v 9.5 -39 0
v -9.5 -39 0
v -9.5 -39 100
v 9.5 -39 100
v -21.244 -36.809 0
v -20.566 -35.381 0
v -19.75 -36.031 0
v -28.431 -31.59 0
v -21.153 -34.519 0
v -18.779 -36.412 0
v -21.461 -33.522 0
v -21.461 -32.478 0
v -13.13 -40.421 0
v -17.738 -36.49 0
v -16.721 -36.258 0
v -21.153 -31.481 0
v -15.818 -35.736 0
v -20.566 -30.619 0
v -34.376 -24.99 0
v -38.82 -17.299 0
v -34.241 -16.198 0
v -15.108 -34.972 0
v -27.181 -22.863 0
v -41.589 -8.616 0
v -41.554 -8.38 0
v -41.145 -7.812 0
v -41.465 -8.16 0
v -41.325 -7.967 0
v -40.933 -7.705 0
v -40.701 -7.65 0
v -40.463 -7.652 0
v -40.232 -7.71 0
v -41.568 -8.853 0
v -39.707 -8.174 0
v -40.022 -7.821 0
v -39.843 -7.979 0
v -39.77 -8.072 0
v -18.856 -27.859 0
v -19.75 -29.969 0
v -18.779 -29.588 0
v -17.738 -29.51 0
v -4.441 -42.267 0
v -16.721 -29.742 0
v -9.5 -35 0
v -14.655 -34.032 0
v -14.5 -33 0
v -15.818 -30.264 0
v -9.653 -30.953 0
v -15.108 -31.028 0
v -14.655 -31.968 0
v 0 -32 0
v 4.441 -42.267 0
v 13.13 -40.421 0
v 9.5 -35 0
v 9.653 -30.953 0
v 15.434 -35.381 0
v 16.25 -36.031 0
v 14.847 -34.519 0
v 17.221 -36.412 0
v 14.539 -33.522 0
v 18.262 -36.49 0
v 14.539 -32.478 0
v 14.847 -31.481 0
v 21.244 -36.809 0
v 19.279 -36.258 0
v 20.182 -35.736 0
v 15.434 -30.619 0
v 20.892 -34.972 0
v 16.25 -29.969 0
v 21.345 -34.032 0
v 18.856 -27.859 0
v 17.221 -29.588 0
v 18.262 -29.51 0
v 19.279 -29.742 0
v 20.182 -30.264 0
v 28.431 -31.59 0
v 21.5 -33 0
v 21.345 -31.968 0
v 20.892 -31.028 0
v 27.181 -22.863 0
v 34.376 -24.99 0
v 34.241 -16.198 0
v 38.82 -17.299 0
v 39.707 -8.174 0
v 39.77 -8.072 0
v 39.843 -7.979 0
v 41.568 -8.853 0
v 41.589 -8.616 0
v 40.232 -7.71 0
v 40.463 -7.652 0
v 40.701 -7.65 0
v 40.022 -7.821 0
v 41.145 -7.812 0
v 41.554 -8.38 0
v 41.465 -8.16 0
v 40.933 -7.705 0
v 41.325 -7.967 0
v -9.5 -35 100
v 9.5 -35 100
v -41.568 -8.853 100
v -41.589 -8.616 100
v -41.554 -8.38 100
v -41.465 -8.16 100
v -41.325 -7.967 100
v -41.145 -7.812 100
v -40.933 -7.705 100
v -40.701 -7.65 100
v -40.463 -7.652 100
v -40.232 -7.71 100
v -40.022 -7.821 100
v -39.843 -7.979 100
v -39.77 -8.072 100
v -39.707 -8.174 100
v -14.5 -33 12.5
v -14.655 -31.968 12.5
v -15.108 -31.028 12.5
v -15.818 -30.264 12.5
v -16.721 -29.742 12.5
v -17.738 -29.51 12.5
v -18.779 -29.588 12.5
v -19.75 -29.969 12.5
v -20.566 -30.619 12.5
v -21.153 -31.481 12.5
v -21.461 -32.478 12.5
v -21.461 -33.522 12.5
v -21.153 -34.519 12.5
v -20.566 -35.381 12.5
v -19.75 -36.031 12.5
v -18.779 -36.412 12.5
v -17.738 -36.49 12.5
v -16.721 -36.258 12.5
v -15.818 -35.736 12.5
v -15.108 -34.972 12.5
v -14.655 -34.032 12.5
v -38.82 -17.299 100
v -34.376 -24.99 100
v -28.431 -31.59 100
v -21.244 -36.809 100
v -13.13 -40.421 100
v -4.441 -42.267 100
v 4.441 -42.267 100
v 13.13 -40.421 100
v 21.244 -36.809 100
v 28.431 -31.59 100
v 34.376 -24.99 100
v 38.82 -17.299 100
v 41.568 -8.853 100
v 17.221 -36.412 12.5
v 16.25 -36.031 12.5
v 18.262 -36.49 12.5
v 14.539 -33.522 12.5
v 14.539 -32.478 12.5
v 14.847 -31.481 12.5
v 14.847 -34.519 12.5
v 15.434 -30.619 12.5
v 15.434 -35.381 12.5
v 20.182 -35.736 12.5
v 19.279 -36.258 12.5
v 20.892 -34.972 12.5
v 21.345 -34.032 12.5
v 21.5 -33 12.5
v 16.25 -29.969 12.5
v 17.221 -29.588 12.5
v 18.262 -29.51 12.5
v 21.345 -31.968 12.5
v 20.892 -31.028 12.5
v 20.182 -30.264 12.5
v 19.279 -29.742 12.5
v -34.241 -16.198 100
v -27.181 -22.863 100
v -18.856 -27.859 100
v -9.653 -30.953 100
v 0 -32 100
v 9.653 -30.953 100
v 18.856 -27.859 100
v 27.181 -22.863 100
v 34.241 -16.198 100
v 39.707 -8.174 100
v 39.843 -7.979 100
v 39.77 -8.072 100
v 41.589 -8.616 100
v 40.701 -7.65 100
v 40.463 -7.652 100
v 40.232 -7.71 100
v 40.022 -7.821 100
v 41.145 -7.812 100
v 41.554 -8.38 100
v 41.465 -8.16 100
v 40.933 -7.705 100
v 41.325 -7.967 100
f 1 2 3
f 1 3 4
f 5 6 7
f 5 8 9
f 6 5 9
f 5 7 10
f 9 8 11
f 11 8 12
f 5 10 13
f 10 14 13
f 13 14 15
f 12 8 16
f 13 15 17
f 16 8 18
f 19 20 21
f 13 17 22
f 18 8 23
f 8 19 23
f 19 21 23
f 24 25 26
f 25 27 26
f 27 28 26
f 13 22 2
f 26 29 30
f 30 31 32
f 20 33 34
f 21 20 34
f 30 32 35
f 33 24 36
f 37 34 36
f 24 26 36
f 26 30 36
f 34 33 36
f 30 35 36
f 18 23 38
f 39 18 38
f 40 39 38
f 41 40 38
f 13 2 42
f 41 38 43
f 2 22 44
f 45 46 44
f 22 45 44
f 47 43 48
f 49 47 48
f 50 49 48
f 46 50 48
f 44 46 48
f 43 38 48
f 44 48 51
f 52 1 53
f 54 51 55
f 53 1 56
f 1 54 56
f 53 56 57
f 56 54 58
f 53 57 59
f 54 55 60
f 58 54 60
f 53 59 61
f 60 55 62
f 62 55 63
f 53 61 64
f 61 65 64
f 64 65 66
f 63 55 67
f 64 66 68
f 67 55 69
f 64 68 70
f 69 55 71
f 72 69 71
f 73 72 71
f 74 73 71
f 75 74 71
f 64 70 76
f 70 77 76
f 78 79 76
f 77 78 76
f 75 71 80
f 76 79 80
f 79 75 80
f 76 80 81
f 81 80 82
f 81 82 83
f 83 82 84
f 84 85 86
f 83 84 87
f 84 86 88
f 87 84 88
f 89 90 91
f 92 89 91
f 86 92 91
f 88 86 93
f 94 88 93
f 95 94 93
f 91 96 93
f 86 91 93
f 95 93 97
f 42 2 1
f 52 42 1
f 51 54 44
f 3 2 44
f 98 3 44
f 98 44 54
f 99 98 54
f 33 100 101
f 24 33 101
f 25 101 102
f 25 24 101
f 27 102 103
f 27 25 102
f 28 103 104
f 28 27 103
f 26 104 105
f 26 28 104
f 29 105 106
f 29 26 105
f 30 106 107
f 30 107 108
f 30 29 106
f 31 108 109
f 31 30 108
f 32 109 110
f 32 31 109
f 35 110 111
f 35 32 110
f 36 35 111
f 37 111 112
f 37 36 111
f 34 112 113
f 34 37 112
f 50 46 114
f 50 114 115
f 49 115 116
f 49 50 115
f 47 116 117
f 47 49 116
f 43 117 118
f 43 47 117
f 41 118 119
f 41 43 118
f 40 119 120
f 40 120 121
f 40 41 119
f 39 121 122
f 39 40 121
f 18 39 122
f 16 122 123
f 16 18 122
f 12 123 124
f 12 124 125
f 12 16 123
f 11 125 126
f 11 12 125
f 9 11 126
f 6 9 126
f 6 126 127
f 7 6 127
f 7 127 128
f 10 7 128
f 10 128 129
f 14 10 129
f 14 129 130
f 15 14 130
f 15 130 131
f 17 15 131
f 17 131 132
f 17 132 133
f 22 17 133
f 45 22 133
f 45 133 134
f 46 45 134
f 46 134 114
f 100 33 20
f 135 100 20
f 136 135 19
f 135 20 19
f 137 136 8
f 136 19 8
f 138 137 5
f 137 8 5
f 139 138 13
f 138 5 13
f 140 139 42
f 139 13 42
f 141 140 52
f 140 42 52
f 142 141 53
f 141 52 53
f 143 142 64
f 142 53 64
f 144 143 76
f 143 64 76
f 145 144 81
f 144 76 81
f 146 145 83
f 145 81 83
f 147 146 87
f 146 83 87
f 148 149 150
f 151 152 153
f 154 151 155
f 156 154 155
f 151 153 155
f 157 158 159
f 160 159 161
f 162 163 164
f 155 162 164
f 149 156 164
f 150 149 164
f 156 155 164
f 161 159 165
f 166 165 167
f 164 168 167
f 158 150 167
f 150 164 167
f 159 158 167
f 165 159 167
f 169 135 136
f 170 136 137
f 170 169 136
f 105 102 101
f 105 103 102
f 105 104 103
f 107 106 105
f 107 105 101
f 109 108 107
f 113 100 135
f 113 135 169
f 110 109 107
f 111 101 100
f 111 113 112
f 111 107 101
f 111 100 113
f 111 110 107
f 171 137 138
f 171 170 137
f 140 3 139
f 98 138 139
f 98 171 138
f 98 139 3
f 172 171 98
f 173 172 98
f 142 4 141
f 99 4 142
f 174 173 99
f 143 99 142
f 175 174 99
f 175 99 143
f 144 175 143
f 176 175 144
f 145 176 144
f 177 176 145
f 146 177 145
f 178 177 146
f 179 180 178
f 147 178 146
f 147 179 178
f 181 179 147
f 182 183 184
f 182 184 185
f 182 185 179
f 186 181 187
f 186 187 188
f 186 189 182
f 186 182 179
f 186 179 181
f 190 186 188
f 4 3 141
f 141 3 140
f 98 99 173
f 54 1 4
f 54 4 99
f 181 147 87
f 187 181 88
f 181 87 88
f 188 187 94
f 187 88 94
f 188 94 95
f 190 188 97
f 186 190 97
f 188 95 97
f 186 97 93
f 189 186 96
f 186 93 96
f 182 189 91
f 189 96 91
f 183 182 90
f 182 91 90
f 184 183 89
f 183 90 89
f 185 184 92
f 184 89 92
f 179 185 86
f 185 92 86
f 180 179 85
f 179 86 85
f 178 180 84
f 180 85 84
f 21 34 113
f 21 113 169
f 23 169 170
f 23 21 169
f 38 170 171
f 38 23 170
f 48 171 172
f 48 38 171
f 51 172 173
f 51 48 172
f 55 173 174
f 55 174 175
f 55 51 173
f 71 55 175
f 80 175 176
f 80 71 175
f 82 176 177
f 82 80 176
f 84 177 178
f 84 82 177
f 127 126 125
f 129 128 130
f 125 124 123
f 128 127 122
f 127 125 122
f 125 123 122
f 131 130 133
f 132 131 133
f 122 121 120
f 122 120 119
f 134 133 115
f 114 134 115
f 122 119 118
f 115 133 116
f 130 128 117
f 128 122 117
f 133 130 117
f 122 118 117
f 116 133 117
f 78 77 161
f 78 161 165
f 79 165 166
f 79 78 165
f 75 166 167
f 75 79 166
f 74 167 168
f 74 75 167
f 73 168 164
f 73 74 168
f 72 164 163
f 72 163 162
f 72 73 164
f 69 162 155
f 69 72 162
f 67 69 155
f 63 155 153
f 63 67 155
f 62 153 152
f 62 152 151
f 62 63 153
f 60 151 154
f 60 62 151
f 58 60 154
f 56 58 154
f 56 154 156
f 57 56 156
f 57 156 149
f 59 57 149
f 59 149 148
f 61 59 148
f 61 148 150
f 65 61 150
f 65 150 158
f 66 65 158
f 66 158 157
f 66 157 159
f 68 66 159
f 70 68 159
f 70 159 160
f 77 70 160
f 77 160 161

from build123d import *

# Parameters (mm, degrees)
CYLINDER010_R     = 3.5
CYLINDER010_DEPTH = 25
CYLINDER006_R     = 3.5
CYLINDER006_DEPTH = 25
BOX_W             = 19
BOX_H             = 4
BOX_DEPTH         = 100
CYLINDER001_R     = 45
CYLINDER001_DEPTH = 100
CYLINDER_R        = 42.5
CYLINDER_DEPTH    = 100
FILLET_R          = 1
FILLET001_R       = 1


with BuildPart() as cylindre010:
    # Cylinder010 → Cylinder010 (new body)
    with BuildSketch(Plane(origin=(18, -33, -12.5), x_dir=(1, 0, 0), z_dir=(0, 0, 1))):
        Circle(CYLINDER010_R)
    extrude(amount=CYLINDER010_DEPTH)


with BuildPart() as cylindre006:
    # Cylinder006 → Cylinder006 (new body)
    with BuildSketch(Plane(origin=(-18, -33, -12.5), x_dir=(1, 0, 0), z_dir=(0, 0, 1))):
        Circle(CYLINDER006_R)
    extrude(amount=CYLINDER006_DEPTH)


with BuildPart() as cube:
    # Box → Box (new body)
    with BuildSketch(Plane(origin=(-9.5, -39, 0), x_dir=(1, 0, 0), z_dir=(0, 0, 1))):
        with Locations((9.5, 2)):
            Rectangle(BOX_W, BOX_H)
    extrude(amount=BOX_DEPTH)


with BuildPart() as cylindre001:
    # Cylinder001 → Cylinder001 (new body)
    with BuildSketch(Plane(origin=(0, 13, 0), x_dir=(1, 0, 0), z_dir=(0, 0, 1))):
        Circle(CYLINDER001_R)
    extrude(amount=CYLINDER001_DEPTH)


with BuildPart() as cut009:
    # Cylinder → Cylinder (new body)
    with BuildSketch(Plane.XY):
        Circle(CYLINDER_R)
    extrude(amount=CYLINDER_DEPTH)

    # Cut: cut Cylindre001
    add(cylindre001.part, mode=Mode.SUBTRACT)

    # Fillet
    fillet_edges = [cut009.edges().sort_by_distance(p)[0] for p in [
        (-42.456904, -1.913462, 50),
    ]]
    fillet(fillet_edges, radius=FILLET_R)

    # Fillet001
    fillet001_edges = [cut009.edges().sort_by_distance(p)[0] for p in [
        (42.456904, -1.913462, 50),
    ]]
    fillet(fillet001_edges, radius=FILLET001_R)

    # Cut001: cut Cube
    add(cube.part, mode=Mode.SUBTRACT)

    # Cut006: cut Cylindre006
    add(cylindre006.part, mode=Mode.SUBTRACT)

    # Cut009: cut Cylindre010
    add(cylindre010.part, mode=Mode.SUBTRACT)


solid = cut009.part
